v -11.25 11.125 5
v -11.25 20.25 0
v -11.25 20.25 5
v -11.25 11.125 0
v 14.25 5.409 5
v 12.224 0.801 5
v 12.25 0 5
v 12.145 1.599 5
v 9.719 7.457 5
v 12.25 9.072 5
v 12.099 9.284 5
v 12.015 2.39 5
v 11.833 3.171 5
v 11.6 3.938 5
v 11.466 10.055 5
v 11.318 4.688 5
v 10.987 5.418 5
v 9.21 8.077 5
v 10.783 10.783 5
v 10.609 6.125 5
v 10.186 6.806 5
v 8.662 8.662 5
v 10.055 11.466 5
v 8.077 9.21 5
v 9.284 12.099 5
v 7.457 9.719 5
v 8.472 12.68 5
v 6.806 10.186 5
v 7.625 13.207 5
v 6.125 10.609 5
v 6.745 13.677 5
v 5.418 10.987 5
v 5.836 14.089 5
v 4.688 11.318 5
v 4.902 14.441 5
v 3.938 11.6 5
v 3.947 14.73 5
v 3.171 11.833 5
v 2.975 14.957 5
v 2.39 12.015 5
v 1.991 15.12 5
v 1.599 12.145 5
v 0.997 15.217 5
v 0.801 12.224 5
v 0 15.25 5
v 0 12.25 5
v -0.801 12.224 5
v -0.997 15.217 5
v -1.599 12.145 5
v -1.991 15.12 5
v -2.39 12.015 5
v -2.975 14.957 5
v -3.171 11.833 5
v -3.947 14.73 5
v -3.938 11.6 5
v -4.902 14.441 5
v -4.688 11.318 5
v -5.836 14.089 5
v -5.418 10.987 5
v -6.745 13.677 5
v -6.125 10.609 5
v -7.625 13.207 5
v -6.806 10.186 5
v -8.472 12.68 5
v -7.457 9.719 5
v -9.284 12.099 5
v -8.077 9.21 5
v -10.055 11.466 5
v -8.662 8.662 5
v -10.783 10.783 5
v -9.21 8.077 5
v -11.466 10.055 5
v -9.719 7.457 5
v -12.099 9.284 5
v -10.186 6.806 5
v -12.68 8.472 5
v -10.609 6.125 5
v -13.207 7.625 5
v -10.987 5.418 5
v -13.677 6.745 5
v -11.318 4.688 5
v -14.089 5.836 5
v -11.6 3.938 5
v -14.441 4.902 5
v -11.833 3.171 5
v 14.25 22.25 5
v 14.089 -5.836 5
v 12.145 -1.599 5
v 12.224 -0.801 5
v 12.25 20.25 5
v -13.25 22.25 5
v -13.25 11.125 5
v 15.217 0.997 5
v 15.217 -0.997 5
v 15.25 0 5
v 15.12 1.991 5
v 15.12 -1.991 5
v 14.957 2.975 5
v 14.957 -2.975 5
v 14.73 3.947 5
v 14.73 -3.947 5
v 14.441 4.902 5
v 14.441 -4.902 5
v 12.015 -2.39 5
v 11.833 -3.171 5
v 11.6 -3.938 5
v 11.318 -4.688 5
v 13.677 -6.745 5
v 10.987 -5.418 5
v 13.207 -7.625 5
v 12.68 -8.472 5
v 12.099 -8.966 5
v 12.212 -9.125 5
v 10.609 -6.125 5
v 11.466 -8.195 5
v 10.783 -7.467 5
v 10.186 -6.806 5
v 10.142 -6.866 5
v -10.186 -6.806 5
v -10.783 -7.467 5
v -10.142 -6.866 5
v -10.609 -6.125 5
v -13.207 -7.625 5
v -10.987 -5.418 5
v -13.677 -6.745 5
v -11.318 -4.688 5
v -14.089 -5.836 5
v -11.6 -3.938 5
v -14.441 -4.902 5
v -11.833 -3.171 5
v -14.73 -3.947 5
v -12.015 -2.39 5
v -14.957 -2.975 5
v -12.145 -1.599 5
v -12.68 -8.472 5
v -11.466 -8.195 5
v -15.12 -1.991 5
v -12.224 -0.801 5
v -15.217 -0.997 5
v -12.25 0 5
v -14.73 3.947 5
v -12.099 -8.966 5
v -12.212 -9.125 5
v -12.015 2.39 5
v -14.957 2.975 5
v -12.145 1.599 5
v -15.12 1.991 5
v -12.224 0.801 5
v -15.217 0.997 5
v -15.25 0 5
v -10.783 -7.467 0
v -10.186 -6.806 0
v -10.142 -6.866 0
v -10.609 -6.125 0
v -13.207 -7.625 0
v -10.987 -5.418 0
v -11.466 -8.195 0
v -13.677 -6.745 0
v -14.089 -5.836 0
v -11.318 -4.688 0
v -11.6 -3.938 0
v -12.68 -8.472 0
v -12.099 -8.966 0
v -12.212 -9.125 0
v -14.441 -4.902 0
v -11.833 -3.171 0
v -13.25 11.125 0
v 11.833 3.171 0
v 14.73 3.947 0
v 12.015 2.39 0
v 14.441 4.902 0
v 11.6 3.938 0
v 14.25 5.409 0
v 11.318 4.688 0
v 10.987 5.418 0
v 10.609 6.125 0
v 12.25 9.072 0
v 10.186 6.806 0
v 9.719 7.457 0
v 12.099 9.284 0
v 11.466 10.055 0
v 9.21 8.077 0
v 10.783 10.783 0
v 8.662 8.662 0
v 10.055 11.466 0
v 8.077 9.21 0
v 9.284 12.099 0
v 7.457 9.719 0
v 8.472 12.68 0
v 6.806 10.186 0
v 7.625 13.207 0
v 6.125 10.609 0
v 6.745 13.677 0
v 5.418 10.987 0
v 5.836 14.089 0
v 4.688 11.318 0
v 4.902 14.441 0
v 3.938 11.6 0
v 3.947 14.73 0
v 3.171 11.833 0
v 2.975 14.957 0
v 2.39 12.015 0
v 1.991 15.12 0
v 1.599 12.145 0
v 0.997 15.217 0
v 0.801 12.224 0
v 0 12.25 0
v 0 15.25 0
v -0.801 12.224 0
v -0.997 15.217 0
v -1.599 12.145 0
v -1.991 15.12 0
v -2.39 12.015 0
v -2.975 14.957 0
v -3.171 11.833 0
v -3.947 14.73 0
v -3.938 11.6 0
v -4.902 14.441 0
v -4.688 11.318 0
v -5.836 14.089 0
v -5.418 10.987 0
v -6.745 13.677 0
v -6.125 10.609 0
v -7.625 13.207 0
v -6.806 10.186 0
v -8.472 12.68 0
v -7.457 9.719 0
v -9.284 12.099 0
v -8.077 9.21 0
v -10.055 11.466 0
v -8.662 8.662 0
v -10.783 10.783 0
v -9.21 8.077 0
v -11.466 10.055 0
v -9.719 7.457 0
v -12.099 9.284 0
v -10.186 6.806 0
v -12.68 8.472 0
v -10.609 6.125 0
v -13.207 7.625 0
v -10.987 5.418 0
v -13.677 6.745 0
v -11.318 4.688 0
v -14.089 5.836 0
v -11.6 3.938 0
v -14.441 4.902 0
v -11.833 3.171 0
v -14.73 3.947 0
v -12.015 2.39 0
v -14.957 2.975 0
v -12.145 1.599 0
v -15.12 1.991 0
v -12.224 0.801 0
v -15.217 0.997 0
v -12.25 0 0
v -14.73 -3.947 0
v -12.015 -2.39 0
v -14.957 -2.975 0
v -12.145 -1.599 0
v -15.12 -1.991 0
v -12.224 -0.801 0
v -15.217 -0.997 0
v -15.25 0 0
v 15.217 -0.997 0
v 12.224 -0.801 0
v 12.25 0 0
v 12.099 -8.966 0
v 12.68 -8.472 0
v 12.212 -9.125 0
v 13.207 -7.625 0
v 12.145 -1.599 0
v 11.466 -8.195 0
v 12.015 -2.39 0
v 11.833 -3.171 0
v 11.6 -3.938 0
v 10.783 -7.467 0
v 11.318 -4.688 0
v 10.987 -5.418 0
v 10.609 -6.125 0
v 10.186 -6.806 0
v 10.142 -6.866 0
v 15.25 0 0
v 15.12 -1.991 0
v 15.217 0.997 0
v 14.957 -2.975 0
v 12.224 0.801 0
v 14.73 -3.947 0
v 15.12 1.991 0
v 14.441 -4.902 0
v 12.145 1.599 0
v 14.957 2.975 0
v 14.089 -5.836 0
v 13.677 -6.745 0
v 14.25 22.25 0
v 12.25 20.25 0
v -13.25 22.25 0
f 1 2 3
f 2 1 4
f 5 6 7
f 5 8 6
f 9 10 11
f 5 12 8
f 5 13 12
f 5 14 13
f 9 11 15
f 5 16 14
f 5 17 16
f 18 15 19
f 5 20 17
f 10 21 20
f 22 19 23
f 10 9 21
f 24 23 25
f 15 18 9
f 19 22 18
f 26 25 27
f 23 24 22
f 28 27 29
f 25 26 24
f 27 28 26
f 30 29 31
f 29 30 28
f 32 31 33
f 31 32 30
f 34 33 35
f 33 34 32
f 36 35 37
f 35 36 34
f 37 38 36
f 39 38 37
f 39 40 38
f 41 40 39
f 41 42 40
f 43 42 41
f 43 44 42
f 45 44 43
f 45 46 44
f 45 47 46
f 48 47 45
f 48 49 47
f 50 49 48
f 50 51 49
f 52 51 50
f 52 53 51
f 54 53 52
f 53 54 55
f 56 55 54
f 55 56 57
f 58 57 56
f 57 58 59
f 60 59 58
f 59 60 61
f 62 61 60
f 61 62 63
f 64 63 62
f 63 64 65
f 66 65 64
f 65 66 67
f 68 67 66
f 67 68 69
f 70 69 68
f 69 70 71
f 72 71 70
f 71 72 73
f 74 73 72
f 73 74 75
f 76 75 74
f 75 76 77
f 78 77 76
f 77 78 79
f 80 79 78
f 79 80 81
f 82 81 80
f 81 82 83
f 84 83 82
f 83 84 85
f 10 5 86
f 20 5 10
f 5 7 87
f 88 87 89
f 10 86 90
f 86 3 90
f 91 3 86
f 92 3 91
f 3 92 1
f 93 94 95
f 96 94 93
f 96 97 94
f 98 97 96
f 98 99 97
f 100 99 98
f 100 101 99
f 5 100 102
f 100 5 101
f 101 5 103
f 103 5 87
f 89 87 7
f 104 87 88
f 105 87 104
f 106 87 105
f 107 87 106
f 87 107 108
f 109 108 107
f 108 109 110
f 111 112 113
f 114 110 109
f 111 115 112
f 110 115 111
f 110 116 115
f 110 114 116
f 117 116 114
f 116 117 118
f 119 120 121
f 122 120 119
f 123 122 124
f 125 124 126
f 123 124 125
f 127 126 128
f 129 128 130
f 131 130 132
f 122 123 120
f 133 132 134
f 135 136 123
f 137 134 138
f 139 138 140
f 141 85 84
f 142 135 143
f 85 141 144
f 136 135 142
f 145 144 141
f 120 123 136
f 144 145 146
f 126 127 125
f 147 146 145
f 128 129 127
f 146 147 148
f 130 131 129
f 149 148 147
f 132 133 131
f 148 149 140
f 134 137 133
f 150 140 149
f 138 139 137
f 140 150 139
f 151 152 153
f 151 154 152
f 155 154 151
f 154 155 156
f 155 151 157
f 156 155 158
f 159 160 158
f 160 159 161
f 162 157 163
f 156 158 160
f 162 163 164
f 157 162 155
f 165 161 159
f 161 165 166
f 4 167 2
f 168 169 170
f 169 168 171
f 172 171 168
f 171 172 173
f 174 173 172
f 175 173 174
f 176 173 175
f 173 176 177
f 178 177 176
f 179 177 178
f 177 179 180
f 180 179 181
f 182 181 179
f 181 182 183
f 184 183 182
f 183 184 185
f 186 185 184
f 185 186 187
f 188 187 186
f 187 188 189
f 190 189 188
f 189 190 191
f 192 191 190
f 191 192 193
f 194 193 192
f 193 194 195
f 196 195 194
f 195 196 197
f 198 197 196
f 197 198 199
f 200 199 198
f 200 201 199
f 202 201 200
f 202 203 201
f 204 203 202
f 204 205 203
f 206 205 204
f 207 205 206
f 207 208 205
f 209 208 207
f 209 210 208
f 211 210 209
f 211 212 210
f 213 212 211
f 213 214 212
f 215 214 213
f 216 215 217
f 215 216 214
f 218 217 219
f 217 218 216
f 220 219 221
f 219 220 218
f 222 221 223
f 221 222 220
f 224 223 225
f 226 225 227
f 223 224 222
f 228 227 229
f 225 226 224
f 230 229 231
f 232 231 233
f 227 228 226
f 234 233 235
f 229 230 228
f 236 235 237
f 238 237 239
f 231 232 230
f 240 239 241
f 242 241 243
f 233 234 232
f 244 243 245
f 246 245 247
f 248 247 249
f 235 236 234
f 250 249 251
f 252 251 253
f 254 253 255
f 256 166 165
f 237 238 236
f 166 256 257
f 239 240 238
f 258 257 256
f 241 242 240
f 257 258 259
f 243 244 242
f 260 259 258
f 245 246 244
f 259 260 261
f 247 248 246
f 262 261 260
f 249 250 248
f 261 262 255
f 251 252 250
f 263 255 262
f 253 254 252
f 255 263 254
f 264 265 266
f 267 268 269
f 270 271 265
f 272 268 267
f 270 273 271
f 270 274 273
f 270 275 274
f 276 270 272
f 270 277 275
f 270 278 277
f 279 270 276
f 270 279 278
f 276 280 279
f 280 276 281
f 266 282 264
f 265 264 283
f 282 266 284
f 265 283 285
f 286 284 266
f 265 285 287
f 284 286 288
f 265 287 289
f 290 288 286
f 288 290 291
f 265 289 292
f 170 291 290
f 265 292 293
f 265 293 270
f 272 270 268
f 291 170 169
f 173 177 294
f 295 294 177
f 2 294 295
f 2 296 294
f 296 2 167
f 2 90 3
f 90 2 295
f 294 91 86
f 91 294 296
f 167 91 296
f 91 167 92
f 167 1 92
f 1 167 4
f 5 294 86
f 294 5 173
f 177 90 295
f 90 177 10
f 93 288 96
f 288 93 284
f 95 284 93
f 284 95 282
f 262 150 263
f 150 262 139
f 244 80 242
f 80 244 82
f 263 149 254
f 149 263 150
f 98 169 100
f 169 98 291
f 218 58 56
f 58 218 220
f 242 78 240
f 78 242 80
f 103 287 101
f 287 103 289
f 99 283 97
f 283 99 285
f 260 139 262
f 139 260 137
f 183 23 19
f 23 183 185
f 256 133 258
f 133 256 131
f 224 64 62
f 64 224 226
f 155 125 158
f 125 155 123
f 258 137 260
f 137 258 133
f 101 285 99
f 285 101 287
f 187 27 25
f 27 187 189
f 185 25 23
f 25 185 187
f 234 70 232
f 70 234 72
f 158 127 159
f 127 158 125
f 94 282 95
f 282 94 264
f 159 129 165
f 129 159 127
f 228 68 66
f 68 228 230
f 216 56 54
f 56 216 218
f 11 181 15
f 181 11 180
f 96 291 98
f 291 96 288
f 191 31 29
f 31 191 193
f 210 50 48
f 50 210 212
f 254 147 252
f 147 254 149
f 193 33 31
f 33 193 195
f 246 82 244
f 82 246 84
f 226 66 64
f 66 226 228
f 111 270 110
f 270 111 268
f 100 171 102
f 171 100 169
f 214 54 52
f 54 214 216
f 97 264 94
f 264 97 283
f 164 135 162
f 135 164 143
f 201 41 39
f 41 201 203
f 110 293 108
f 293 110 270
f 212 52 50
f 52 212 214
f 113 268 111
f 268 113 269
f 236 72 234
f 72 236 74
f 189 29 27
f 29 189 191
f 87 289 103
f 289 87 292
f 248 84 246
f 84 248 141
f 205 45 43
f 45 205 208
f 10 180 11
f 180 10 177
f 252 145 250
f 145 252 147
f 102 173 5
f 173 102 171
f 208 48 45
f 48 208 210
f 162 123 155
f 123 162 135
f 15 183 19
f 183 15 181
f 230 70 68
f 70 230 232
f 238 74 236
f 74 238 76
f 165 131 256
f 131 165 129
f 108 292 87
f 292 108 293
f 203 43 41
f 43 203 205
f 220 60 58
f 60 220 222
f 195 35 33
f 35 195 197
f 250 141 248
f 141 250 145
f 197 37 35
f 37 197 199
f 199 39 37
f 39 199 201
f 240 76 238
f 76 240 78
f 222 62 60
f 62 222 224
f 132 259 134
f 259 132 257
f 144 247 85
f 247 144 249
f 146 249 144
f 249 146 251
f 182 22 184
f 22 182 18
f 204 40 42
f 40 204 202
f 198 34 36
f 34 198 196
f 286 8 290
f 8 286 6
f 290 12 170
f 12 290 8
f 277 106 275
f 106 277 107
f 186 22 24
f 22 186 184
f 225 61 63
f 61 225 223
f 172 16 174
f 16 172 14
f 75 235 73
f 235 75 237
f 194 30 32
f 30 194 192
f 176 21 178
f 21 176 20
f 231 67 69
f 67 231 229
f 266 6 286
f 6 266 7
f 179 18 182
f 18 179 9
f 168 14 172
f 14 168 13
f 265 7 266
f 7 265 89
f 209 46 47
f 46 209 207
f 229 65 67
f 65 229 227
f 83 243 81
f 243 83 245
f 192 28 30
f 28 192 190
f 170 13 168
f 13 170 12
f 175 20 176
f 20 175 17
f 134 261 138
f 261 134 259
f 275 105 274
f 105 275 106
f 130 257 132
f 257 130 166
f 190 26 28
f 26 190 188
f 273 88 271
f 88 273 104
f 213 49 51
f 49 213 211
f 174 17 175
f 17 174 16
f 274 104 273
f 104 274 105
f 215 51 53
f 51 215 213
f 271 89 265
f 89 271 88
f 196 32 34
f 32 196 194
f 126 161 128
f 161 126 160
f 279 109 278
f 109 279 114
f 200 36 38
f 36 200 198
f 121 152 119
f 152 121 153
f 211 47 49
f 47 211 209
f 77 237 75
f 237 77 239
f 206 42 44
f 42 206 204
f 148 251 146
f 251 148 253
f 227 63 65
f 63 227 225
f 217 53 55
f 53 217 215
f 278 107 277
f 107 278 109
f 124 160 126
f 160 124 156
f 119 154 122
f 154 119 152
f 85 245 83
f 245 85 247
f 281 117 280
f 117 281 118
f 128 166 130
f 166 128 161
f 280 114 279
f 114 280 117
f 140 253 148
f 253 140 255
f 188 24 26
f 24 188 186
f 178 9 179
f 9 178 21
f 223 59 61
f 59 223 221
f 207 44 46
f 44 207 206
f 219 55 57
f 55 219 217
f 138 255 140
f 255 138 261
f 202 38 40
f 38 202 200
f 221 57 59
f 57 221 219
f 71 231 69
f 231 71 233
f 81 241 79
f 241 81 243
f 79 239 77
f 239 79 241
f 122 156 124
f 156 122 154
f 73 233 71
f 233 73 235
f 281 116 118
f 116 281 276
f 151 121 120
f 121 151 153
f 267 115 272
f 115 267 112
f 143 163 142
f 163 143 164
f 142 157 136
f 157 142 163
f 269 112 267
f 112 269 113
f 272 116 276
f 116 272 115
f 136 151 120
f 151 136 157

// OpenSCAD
pole_dia = 24.5;
pole_r = pole_dia/2;
pole_thick = 3;
pole_h = 5;
clip_depth = 10;
clip_thick = 2;

$fn = 96;

clip_depth2 = clip_depth + pole_r;

difference (){

  union(){
    translate([pole_r, 0, 0]){
      cube([clip_thick, clip_depth2, pole_h]);
      
      translate([0+1, clip_depth2, 0]){
        rotate(a=180, v=[0,0,1]){
          cube([(pole_r*2), clip_thick, pole_h]);
          
          translate([(pole_r*2), 0, 0]){
            cube([clip_thick, clip_depth2/2, pole_h]);
          }
        }
      }      
    }
    
    cylinder(r=pole_r+pole_thick, h=pole_h);
  }

  translate([0, 0, 0-(pole_h*0.1) ]){
    cylinder(r=pole_r, h=pole_h*1.2);
    
    translate([0, 0-pole_r-(pole_thick*2), 0])
      cylinder(r=pole_r+pole_thick, h=pole_h*1.2);
  }
}
